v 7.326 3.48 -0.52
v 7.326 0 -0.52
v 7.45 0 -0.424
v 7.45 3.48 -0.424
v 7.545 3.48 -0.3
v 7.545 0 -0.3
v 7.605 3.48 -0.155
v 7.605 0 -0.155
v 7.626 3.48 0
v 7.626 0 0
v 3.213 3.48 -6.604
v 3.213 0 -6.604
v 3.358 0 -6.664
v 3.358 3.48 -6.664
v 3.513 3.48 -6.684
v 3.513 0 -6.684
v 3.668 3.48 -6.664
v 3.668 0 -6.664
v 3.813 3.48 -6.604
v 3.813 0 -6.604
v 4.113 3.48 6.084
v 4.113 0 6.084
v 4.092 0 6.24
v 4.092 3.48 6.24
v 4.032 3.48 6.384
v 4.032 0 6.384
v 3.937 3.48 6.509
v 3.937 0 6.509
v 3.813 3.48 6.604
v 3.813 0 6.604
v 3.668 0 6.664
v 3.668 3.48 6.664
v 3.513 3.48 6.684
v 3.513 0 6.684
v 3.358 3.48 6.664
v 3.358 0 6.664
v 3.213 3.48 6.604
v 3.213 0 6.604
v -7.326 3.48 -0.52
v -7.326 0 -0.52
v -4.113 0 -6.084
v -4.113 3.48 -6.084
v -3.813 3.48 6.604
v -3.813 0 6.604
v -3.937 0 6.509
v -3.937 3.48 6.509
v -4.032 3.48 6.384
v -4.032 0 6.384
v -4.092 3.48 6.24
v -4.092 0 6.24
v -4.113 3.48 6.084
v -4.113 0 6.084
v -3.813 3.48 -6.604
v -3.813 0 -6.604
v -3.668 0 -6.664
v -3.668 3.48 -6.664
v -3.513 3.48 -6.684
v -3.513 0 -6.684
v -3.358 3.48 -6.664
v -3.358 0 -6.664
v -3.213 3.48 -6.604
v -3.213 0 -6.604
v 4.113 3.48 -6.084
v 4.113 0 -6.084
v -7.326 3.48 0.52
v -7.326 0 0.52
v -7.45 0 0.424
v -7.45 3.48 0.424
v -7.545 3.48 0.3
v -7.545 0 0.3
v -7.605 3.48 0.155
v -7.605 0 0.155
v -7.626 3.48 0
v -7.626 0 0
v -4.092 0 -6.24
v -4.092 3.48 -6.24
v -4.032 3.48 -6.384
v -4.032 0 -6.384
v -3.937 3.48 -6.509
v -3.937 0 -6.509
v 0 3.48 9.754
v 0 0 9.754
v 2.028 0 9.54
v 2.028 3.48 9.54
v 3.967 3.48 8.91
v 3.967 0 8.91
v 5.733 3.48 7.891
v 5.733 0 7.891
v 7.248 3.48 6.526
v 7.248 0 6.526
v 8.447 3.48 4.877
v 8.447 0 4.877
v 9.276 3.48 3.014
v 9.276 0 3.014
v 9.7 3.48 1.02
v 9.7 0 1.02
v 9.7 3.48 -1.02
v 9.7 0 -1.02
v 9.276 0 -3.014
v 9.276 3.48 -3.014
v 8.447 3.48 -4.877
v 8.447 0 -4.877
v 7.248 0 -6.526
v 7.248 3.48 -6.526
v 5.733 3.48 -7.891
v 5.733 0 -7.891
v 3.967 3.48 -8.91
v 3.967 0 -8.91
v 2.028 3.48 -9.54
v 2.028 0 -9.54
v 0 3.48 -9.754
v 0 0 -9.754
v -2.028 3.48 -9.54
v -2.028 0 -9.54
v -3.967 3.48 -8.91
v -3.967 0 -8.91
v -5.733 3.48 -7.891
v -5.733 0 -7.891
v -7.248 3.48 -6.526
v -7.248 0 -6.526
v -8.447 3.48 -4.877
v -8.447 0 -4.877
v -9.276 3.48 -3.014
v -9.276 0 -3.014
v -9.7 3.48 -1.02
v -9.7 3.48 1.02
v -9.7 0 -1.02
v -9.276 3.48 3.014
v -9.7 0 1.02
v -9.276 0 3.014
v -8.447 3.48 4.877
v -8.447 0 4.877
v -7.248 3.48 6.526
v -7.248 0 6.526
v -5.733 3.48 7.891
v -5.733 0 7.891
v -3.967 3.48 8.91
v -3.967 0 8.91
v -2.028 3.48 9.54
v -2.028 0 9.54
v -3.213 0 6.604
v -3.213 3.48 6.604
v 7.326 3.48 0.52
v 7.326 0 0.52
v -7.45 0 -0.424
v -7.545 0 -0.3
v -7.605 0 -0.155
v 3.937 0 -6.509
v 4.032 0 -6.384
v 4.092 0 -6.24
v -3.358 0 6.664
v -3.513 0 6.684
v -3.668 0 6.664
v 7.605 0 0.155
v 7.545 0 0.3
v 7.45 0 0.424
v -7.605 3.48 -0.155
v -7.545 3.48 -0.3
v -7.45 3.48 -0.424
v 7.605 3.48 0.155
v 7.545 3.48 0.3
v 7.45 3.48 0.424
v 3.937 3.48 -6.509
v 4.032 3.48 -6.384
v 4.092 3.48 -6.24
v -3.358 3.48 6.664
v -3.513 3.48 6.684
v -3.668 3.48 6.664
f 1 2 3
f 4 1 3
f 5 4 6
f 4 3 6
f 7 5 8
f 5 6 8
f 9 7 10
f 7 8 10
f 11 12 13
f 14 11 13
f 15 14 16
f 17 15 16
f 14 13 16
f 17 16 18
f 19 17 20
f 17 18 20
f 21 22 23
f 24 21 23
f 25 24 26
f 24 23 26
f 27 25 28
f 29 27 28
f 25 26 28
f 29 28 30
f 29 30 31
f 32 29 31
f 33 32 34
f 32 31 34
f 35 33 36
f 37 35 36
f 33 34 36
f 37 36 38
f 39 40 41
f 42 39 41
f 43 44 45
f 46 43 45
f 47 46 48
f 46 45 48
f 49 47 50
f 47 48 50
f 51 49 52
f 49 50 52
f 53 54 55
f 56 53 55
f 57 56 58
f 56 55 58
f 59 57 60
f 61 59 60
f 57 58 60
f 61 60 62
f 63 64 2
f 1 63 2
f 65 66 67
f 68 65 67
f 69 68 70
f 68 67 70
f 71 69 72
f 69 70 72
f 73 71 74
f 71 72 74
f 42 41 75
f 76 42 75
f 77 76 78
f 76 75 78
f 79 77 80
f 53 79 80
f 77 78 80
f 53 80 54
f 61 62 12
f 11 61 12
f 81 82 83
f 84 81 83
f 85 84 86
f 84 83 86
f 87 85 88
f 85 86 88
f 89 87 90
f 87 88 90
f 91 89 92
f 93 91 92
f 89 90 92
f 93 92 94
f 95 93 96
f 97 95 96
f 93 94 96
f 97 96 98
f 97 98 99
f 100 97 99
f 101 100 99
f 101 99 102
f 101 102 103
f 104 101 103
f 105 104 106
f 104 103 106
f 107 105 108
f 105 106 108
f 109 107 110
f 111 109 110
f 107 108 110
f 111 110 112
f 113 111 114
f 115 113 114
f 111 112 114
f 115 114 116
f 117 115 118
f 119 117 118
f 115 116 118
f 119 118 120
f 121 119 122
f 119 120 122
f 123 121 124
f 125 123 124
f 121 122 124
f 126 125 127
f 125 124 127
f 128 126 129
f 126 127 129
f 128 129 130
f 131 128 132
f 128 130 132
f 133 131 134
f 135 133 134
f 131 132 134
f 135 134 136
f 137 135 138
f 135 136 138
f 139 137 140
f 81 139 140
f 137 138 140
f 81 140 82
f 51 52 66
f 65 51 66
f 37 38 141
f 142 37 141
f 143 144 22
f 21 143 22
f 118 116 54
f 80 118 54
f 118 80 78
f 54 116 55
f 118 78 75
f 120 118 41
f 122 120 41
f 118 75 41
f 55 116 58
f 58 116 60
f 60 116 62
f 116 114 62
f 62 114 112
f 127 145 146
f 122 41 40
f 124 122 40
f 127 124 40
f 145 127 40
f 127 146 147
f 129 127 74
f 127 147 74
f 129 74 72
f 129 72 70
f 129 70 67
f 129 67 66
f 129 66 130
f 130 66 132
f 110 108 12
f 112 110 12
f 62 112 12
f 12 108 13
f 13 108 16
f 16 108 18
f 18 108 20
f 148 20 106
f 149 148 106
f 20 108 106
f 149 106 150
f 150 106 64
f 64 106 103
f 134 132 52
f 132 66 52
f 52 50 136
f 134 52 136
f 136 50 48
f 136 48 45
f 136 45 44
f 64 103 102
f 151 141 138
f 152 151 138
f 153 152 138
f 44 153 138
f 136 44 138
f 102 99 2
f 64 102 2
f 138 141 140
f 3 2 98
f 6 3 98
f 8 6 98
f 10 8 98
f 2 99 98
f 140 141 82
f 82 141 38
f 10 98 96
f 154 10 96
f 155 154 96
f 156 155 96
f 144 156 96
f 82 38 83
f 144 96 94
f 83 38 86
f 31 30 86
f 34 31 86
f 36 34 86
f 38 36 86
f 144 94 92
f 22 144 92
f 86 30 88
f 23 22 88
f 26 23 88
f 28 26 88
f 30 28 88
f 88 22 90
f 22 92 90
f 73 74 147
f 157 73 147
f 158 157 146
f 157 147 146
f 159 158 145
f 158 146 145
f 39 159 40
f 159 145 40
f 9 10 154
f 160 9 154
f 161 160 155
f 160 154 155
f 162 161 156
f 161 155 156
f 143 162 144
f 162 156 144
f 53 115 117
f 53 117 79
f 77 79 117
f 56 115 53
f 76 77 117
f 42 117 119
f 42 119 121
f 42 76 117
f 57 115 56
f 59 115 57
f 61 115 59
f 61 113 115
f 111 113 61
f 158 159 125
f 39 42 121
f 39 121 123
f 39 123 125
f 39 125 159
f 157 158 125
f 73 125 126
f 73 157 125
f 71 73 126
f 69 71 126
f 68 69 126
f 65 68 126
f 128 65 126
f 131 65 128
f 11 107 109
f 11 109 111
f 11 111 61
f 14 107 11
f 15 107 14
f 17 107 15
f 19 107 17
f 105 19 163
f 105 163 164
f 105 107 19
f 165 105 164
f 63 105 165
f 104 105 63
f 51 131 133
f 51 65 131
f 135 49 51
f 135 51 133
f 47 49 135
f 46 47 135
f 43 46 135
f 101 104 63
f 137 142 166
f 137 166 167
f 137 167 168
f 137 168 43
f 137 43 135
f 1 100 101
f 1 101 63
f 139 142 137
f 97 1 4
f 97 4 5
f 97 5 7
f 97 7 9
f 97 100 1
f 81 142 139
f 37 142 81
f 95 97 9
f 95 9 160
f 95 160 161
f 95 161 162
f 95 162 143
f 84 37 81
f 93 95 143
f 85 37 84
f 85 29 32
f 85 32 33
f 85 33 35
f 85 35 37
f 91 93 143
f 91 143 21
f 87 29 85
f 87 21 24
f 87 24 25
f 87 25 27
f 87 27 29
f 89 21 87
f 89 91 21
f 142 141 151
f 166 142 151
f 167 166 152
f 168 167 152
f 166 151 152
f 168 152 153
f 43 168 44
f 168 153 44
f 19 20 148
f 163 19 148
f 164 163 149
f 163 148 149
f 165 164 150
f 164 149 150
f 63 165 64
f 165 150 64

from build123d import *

# Parameters (mm, degrees)
SKETCH1_R           = 9.7536
BOSS_EXTRUDE1_DEPTH = 3.4798


with BuildPart() as part:
    # Sketch1 → Boss-Extrude1 (new body)
    with BuildSketch(Plane(origin=(0, 0, 0), x_dir=(1, 0, 0), z_dir=(0, 1, 0))):
        with Locations(Location((0, 0, 0), (0, 0, 270))):
            Circle(SKETCH1_R)
        with BuildLine():
            ThreePointArc((3.812821178, 6.604), (4.03243642, 6.384384758), (4.112821178, 6.084384758))
            Line((4.112821178, 6.084384758), (7.325642355, 0.519615242))
            ThreePointArc((7.325642355, 0.519615242), (7.545257598, 0.3), (7.625642355, 0))
            ThreePointArc((7.625642355, 0), (7.545257598, -0.3), (7.325642355, -0.519615242))
            Line((7.325642355, -0.519615242), (4.112821178, -6.084384758))
            ThreePointArc((4.112821178, -6.084384758), (4.03243642, -6.384384758), (3.812821178, -6.604))
            ThreePointArc((3.812821178, -6.604), (3.512821178, -6.684384758), (3.212821178, -6.604))
            Line((3.212821178, -6.604), (-3.212821178, -6.604))
            ThreePointArc((-3.212821178, -6.604), (-3.512821178, -6.684384758), (-3.812821178, -6.604))
            ThreePointArc((-3.812821178, -6.604), (-4.03243642, -6.384384758), (-4.112821178, -6.084384758))
            Line((-4.112821178, -6.084384758), (-7.325642355, -0.519615242))
            ThreePointArc((-7.325642355, -0.519615242), (-7.545257598, -0.3), (-7.625642355, 0))
            ThreePointArc((-7.625642355, 0), (-7.545257598, 0.3), (-7.325642355, 0.519615242))
            Line((-7.325642355, 0.519615242), (-4.112821178, 6.084384758))
            ThreePointArc((-4.112821178, 6.084384758), (-4.03243642, 6.384384758), (-3.812821178, 6.604))
            ThreePointArc((-3.812821178, 6.604), (-3.512821178, 6.684384758), (-3.212821178, 6.604))
            Line((-3.212821178, 6.604), (3.212821178, 6.604))
            ThreePointArc((3.212821178, 6.604), (3.512821178, 6.684384758), (3.812821178, 6.604))
        make_face(mode=Mode.SUBTRACT)
    extrude(amount=BOSS_EXTRUDE1_DEPTH)


solid = part.part
